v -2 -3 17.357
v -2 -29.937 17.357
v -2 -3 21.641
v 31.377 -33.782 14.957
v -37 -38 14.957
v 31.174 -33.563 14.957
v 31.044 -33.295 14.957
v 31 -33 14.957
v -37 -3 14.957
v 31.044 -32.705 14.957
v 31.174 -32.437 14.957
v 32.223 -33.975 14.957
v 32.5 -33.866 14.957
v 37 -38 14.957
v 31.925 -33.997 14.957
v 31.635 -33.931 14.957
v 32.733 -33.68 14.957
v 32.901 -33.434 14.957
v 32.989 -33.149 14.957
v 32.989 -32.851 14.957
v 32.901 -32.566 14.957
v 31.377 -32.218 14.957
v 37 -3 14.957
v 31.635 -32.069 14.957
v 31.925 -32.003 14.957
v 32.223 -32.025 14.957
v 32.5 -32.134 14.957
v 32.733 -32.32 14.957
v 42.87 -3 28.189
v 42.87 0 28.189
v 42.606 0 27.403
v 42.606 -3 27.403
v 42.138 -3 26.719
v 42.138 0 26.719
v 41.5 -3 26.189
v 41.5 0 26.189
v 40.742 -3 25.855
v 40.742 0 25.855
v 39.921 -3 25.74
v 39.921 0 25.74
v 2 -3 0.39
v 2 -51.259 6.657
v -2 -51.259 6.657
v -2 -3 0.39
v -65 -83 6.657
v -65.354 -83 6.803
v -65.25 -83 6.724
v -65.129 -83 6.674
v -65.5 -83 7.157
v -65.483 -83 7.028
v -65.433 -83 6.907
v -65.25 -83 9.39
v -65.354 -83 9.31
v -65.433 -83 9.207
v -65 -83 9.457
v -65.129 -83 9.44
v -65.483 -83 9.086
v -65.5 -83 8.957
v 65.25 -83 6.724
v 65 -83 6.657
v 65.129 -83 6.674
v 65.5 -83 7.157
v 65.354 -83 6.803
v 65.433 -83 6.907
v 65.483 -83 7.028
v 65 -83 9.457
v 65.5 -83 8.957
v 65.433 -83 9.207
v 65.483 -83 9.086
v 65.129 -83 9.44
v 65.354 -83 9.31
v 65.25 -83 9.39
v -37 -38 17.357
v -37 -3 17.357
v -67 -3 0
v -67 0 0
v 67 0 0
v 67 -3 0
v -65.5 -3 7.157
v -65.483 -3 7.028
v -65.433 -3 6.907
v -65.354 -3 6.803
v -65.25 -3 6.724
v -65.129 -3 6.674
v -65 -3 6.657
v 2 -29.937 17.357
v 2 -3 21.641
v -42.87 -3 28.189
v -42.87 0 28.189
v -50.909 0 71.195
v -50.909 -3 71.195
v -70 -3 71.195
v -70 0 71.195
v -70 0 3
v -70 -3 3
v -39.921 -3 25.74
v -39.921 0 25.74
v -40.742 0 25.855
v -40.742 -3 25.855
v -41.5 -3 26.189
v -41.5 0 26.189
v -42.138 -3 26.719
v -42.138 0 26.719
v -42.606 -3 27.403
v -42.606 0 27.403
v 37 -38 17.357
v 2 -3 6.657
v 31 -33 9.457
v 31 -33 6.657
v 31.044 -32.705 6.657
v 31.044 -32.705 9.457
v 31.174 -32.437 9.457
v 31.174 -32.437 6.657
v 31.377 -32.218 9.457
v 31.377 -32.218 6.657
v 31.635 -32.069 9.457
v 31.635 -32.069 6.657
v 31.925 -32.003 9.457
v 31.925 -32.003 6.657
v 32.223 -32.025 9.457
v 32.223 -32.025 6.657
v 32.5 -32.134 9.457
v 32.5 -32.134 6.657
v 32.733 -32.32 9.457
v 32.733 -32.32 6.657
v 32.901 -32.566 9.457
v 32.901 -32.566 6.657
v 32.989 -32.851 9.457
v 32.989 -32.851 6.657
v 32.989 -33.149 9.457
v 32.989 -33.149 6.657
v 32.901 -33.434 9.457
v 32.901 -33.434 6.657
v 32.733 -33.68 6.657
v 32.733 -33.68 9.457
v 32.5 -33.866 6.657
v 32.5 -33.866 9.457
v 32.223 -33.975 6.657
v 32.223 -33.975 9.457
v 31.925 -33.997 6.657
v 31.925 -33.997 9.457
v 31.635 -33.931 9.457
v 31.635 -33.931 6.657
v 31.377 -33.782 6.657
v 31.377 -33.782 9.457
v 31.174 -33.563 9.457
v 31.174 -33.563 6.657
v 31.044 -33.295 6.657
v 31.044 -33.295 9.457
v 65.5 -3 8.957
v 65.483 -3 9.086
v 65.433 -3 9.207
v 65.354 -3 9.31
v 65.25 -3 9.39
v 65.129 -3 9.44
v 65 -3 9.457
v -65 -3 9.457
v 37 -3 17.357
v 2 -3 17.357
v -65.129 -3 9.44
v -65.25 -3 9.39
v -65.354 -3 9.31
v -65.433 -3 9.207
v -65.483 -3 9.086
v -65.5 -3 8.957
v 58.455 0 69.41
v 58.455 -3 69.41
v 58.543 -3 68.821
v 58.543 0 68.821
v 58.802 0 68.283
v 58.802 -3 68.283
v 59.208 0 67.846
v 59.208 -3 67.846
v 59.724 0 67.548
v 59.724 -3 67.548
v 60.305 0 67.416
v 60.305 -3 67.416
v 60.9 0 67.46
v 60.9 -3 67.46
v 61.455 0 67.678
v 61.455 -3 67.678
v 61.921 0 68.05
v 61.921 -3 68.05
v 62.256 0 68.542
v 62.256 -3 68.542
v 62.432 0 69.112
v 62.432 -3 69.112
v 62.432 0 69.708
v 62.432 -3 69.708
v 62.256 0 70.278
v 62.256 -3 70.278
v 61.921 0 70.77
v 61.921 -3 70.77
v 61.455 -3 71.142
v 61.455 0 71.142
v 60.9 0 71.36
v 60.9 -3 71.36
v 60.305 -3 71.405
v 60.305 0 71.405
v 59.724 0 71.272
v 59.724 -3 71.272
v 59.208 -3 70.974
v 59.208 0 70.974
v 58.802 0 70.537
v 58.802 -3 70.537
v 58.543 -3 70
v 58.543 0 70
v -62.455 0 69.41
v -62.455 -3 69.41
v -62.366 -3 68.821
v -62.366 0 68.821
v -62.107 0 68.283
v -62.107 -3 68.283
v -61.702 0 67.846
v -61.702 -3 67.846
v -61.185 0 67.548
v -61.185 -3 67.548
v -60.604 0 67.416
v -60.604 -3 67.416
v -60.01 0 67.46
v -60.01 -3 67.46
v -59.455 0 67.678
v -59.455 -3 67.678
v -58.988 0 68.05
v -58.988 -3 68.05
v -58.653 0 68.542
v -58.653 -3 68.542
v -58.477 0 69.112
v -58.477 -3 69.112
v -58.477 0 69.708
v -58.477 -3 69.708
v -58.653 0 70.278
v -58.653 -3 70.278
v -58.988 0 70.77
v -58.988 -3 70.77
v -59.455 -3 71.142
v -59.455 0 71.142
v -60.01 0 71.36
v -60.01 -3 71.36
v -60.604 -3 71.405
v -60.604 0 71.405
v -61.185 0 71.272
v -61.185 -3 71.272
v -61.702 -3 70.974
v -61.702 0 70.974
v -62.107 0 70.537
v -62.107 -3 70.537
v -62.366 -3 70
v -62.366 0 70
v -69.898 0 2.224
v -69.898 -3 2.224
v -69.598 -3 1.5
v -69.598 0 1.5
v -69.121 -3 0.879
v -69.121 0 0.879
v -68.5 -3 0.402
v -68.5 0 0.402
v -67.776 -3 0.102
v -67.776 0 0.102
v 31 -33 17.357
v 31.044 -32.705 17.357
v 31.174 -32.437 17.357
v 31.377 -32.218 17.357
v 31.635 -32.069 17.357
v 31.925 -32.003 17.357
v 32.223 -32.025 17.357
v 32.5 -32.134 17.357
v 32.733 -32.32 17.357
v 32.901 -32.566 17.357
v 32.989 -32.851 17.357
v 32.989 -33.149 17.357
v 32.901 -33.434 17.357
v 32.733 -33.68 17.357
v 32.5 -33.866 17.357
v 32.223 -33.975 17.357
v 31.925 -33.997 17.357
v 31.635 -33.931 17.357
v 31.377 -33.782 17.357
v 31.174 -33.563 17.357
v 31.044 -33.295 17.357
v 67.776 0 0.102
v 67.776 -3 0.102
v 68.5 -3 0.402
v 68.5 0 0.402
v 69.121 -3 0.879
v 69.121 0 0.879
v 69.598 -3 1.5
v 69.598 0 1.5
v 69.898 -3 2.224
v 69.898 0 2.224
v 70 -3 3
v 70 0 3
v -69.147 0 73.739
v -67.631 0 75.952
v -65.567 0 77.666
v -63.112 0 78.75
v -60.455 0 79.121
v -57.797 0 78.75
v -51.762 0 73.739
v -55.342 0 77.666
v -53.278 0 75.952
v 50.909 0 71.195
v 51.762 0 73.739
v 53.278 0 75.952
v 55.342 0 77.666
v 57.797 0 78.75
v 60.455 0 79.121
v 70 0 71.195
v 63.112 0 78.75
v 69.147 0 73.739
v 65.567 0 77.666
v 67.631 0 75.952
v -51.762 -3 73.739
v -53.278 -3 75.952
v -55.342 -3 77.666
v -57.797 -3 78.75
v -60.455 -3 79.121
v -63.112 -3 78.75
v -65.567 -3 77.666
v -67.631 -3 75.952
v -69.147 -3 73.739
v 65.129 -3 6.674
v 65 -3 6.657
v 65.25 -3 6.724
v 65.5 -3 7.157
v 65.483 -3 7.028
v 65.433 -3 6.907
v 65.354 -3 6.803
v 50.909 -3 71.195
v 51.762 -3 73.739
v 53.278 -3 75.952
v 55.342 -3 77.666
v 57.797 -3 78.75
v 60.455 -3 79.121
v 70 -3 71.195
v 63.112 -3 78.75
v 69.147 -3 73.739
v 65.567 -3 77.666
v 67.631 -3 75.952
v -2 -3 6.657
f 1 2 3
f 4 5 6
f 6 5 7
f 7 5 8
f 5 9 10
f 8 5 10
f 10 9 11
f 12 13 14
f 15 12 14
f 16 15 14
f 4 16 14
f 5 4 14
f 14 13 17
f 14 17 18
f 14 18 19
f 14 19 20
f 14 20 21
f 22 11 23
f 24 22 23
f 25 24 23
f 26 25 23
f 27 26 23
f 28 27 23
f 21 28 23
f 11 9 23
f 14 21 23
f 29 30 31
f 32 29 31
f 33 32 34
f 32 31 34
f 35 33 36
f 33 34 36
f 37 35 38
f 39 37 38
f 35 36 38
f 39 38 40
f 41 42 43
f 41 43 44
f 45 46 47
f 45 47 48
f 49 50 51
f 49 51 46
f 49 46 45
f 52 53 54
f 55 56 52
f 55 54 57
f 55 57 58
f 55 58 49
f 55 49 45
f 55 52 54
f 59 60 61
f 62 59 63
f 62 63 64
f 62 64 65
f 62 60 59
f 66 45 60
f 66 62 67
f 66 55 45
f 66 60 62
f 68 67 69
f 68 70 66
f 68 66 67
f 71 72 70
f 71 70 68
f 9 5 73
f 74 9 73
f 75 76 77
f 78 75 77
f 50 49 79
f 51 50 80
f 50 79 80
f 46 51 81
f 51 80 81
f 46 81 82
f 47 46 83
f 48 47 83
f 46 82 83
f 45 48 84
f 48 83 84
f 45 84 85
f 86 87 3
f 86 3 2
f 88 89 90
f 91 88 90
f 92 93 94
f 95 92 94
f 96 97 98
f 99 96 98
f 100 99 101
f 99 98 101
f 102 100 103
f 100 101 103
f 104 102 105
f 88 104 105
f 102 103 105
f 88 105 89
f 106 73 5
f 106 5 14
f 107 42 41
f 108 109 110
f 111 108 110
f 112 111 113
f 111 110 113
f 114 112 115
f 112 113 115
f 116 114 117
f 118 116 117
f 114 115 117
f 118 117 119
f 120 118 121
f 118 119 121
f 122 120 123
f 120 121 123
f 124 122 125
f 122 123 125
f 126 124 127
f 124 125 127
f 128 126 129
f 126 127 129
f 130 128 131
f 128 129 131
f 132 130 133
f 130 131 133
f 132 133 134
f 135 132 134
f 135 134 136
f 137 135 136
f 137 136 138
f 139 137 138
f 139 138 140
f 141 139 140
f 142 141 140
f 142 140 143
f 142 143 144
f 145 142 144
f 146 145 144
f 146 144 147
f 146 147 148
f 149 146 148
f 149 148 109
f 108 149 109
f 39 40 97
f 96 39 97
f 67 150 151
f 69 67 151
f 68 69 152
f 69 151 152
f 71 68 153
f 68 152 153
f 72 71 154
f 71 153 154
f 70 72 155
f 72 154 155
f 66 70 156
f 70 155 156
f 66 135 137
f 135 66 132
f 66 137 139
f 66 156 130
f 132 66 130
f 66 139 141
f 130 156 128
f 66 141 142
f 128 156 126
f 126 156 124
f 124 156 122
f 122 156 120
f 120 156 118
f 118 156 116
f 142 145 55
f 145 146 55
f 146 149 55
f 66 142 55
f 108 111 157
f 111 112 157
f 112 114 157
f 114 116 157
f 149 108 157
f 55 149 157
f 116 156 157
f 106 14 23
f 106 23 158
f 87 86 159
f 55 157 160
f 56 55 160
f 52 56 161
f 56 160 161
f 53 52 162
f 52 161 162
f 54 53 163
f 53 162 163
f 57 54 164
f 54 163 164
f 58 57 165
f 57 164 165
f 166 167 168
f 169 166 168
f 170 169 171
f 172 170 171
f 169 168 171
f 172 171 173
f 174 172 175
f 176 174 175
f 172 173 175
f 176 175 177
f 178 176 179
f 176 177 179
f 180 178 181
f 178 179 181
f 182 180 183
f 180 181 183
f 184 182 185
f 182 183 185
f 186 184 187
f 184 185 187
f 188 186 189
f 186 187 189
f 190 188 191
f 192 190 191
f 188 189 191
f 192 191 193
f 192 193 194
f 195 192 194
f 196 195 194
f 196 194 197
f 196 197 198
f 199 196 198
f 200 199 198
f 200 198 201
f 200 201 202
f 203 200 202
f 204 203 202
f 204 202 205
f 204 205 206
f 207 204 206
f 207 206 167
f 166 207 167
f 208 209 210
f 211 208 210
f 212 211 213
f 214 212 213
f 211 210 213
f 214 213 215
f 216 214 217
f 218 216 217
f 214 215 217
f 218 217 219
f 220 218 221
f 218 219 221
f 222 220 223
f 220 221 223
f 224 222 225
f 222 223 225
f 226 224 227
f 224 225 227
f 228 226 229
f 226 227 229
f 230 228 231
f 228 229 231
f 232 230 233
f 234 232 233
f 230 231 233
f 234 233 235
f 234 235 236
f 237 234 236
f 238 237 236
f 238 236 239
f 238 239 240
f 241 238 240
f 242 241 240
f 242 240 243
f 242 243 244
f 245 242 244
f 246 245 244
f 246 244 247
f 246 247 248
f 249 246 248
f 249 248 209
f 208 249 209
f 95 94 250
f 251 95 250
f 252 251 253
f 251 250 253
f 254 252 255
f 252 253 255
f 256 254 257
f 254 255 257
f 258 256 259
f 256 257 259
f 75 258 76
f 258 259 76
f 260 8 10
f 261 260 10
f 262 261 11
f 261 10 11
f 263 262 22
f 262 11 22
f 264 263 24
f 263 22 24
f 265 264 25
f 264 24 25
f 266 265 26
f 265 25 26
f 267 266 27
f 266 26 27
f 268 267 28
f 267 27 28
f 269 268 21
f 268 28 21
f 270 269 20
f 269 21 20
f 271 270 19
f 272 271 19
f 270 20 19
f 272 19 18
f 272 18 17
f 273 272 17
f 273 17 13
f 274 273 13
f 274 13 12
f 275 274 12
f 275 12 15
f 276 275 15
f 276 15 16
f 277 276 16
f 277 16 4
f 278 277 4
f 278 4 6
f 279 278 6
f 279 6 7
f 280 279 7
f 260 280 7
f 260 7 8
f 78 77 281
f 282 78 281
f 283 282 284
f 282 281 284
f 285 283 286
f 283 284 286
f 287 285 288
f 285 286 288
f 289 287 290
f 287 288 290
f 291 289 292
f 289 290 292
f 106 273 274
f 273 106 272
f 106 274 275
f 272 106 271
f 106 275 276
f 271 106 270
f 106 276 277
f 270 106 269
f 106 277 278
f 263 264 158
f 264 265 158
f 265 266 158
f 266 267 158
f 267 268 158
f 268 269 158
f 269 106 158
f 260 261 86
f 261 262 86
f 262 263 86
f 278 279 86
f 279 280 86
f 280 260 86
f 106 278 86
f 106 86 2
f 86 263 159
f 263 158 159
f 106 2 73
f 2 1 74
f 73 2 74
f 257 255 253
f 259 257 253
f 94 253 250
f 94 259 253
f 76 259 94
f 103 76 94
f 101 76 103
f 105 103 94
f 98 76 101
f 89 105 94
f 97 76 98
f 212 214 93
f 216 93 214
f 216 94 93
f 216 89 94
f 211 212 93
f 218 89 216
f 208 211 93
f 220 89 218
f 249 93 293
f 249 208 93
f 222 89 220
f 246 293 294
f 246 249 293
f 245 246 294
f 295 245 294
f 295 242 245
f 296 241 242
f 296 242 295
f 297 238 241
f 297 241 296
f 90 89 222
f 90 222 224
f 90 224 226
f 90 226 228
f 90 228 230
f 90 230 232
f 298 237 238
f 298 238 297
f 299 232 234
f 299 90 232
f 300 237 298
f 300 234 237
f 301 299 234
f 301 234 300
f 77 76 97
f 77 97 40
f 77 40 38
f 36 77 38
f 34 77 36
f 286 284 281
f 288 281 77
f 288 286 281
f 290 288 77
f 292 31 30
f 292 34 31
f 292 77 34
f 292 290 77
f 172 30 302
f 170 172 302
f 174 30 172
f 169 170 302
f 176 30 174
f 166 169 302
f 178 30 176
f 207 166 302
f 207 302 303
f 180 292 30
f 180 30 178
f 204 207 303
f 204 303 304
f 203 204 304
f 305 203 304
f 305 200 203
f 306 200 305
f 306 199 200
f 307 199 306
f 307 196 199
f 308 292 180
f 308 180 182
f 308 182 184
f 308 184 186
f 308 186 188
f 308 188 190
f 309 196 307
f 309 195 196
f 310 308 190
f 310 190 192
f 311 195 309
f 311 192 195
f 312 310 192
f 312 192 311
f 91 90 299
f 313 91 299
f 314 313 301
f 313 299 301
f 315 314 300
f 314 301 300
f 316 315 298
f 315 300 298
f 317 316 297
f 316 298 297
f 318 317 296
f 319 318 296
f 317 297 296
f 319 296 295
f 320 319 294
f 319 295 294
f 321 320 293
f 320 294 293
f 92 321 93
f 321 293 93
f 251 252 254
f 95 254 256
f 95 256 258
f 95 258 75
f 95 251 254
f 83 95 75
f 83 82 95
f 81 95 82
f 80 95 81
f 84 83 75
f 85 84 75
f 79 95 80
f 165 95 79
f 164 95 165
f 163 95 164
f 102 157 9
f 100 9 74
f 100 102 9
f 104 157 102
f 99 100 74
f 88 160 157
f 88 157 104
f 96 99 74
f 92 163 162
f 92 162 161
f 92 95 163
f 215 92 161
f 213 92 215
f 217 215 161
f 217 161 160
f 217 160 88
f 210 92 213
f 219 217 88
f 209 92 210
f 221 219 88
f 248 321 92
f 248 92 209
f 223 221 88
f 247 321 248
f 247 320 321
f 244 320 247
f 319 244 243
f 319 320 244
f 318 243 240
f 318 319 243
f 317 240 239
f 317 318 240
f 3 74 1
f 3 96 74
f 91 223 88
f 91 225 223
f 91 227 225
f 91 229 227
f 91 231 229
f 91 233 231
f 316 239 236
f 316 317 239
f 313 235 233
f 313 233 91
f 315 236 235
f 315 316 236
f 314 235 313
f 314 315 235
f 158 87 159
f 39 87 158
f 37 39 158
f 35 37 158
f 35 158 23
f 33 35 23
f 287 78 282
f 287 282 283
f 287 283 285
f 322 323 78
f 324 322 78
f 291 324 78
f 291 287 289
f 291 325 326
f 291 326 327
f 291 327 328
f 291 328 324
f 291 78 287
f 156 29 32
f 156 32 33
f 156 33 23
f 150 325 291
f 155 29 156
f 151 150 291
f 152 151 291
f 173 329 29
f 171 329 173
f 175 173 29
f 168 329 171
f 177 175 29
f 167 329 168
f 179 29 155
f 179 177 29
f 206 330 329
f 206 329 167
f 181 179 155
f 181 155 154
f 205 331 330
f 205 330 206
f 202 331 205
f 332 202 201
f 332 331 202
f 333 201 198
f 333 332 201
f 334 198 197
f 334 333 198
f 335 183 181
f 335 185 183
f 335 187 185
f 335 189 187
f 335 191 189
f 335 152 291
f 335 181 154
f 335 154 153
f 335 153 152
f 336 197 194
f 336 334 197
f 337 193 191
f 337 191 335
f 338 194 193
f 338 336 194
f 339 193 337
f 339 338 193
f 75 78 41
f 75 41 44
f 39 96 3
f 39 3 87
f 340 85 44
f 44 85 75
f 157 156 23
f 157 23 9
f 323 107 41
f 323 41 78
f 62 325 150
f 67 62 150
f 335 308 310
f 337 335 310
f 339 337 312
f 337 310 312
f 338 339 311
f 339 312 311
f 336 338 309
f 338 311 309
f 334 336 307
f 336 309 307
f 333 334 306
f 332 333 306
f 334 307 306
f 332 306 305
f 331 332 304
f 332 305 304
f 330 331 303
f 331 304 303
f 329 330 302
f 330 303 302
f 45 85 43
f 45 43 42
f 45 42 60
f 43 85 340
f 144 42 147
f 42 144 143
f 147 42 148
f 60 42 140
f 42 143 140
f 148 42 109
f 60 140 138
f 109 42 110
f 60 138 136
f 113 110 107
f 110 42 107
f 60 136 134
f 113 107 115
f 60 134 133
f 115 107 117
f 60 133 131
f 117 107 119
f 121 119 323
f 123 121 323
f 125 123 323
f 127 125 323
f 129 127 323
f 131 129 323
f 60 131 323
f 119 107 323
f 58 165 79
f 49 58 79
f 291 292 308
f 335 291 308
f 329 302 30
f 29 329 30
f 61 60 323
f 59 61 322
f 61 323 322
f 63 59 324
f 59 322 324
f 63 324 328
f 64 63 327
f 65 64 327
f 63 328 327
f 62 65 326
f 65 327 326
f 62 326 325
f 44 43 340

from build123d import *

# Parameters (mm, degrees)
F1_DEPTH = 83
F0_W     = 37
F0_H     = 2.4
F2_DEPTH = 38
F3_DEPTH = 3
F4_D     = 4
F5_D     = 4
F7_DEPTH = 2
F8_DEPTH = 2
F10_D    = 2


with BuildPart() as f1:
    # F0 (on Front) → F1 (new body)
    with BuildSketch(Plane.XZ):
        with BuildLine():
            Line((-65, 6.656936314), (0, 6.656936314))
            Line((0, 6.656936314), (0, 9.456936314))
            Line((0, 9.456936314), (-65, 9.456936314))
            ThreePointArc((-65, 9.456936314), (-65.3535533906, 9.3104897046), (-65.5, 8.956936314))
            Line((-65.5, 8.956936314), (-65.5, 7.156936314))
            ThreePointArc((-65.5, 7.156936314), (-65.3535533906, 6.8033829234), (-65, 6.656936314))
        make_face()
        with BuildLine():
            Line((0, 9.456936314), (0, 6.656936314))
            Line((0, 6.656936314), (65, 6.656936314))
            ThreePointArc((65, 6.656936314), (65.3535533906, 6.8033829234), (65.5, 7.156936314))
            Line((65.5, 7.156936314), (65.5, 8.956936314))
            ThreePointArc((65.5, 8.956936314), (65.3535533906, 9.3104897046), (65, 9.456936314))
            Line((65, 9.456936314), (0, 9.456936314))
        make_face()
    extrude(amount=F1_DEPTH)



with BuildPart() as f2:
    # F0 (on Front) → F2 (new body)
    with BuildSketch(Plane.XZ):
        with Locations((-18.5, 16.156936314)):
            Rectangle(F0_W, F0_H)
        with Locations((18.5, 16.156936314)):
            Rectangle(F0_W, F0_H)
    extrude(amount=F2_DEPTH)


with BuildPart() as f1_1:
    add(f1.part)

    add(f2.part)  # F3 merges F2
    # F0 (on Front) → F3 (join)
    with BuildSketch(Plane.XZ):
        with BuildLine():
            ThreePointArc((-50.9090917143, 71.1945314942), (-60.4545458571, 79.1209226904), (-70, 71.1945314942))
            Line((-70, 71.1945314942), (-50.9090917143, 71.1945314942))
        make_face()
        with BuildLine():
            Line((50.9090917143, 71.1945314942), (70, 71.1945314942))
            ThreePointArc((70, 71.1945314942), (60.4545458571, 79.1209226904), (50.9090917143, 71.1945314942))
        make_face()
        with BuildLine():
            Line((0, 6.656936314), (0, 0))
            Line((0, 0), (67, 0))
            ThreePointArc((67, 0), (69.1213203436, 0.8786796564), (70, 3))
            Line((70, 3), (70, 71.1945314942))
            Line((70, 71.1945314942), (50.9090917143, 71.1945314942))
            Line((50.9090917143, 71.1945314942), (42.8696187161, 28.1887182873))
            ThreePointArc((42.8696187161, 28.1887182873), (41.8372358629, 26.4319780432), (39.9207030491, 25.7399862697))
            Line((39.9207030491, 25.7399862697), (0, 25.7399862697))
            Line((0, 25.7399862697), (0, 17.356936314))
            Line((0, 17.356936314), (37, 17.356936314))
            Line((37, 17.356936314), (37, 14.956936314))
            Line((37, 14.956936314), (0, 14.956936314))
            Line((0, 14.956936314), (0, 9.456936314))
            Line((0, 9.456936314), (65, 9.456936314))
            ThreePointArc((65, 9.456936314), (65.3535533906, 9.3104897046), (65.5, 8.956936314))
            Line((65.5, 8.956936314), (65.5, 7.156936314))
            ThreePointArc((65.5, 7.156936314), (65.3535533906, 6.8033829234), (65, 6.656936314))
            Line((65, 6.656936314), (0, 6.656936314))
        make_face()
        with BuildLine():
            Line((-70, 71.1945314942), (-70, 3))
            ThreePointArc((-70, 3), (-69.1213203436, 0.8786796564), (-67, 0))
            Line((-67, 0), (0, 0))
            Line((0, 0), (0, 6.656936314))
            Line((0, 6.656936314), (-65, 6.656936314))
            ThreePointArc((-65, 6.656936314), (-65.3535533906, 6.8033829234), (-65.5, 7.156936314))
            Line((-65.5, 7.156936314), (-65.5, 8.956936314))
            ThreePointArc((-65.5, 8.956936314), (-65.3535533906, 9.3104897046), (-65, 9.456936314))
            Line((-65, 9.456936314), (0, 9.456936314))
            Line((0, 9.456936314), (0, 14.956936314))
            Line((0, 14.956936314), (-37, 14.956936314))
            Line((-37, 14.956936314), (-37, 17.356936314))
            Line((-37, 17.356936314), (0, 17.356936314))
            Line((0, 17.356936314), (0, 25.7399862697))
            Line((0, 25.7399862697), (-39.9207030491, 25.7399862697))
            ThreePointArc((-39.9207030491, 25.7399862697), (-41.8372358629, 26.4319780432), (-42.8696187161, 28.1887182873))
            Line((-42.8696187161, 28.1887182873), (-50.9090917143, 71.1945314942))
            Line((-50.9090917143, 71.1945314942), (-70, 71.1945314942))
        make_face()
    extrude(amount=F3_DEPTH)

    # F4 (through all)
    with Locations(Plane(origin=(0, 0, 0), x_dir=(1, 0, 0), z_dir=(0, 1, 0))):
        with Locations((-60.4545458571, -69.4101117817)):
            Hole(F4_D / 2)

    # F5 (through all)
    with Locations(Plane(origin=(0, 0, 0), x_dir=(1, 0, 0), z_dir=(0, 1, 0))):
        with Locations((60.4545458571, -69.4101117817)):
            Hole(F5_D / 2)

    # F6 (on Right) → F7 (join, symmetric)
    with BuildSketch(Plane.YZ):
        Polygon((-53.0555397272, 6.8902592175), (0, 0), (0, 6.8902592175), align=None)
    extrude(amount=F7_DEPTH, both=True)

    # F6 (on Right) → F8 (join, symmetric)
    with BuildSketch(Plane.YZ):
        Polygon((-30.1237229723, 17.327228561), (-2.9568942264, 17.3339545727), (-2.9568942264, 21.6480610112), align=None)
    extrude(amount=F8_DEPTH, both=True)

    # F10 (through all)
    with Locations(Plane.XY.offset(17.356936314)):
        with Locations((32, -33)):
            Hole(F10_D / 2)


solid = f1_1.part
